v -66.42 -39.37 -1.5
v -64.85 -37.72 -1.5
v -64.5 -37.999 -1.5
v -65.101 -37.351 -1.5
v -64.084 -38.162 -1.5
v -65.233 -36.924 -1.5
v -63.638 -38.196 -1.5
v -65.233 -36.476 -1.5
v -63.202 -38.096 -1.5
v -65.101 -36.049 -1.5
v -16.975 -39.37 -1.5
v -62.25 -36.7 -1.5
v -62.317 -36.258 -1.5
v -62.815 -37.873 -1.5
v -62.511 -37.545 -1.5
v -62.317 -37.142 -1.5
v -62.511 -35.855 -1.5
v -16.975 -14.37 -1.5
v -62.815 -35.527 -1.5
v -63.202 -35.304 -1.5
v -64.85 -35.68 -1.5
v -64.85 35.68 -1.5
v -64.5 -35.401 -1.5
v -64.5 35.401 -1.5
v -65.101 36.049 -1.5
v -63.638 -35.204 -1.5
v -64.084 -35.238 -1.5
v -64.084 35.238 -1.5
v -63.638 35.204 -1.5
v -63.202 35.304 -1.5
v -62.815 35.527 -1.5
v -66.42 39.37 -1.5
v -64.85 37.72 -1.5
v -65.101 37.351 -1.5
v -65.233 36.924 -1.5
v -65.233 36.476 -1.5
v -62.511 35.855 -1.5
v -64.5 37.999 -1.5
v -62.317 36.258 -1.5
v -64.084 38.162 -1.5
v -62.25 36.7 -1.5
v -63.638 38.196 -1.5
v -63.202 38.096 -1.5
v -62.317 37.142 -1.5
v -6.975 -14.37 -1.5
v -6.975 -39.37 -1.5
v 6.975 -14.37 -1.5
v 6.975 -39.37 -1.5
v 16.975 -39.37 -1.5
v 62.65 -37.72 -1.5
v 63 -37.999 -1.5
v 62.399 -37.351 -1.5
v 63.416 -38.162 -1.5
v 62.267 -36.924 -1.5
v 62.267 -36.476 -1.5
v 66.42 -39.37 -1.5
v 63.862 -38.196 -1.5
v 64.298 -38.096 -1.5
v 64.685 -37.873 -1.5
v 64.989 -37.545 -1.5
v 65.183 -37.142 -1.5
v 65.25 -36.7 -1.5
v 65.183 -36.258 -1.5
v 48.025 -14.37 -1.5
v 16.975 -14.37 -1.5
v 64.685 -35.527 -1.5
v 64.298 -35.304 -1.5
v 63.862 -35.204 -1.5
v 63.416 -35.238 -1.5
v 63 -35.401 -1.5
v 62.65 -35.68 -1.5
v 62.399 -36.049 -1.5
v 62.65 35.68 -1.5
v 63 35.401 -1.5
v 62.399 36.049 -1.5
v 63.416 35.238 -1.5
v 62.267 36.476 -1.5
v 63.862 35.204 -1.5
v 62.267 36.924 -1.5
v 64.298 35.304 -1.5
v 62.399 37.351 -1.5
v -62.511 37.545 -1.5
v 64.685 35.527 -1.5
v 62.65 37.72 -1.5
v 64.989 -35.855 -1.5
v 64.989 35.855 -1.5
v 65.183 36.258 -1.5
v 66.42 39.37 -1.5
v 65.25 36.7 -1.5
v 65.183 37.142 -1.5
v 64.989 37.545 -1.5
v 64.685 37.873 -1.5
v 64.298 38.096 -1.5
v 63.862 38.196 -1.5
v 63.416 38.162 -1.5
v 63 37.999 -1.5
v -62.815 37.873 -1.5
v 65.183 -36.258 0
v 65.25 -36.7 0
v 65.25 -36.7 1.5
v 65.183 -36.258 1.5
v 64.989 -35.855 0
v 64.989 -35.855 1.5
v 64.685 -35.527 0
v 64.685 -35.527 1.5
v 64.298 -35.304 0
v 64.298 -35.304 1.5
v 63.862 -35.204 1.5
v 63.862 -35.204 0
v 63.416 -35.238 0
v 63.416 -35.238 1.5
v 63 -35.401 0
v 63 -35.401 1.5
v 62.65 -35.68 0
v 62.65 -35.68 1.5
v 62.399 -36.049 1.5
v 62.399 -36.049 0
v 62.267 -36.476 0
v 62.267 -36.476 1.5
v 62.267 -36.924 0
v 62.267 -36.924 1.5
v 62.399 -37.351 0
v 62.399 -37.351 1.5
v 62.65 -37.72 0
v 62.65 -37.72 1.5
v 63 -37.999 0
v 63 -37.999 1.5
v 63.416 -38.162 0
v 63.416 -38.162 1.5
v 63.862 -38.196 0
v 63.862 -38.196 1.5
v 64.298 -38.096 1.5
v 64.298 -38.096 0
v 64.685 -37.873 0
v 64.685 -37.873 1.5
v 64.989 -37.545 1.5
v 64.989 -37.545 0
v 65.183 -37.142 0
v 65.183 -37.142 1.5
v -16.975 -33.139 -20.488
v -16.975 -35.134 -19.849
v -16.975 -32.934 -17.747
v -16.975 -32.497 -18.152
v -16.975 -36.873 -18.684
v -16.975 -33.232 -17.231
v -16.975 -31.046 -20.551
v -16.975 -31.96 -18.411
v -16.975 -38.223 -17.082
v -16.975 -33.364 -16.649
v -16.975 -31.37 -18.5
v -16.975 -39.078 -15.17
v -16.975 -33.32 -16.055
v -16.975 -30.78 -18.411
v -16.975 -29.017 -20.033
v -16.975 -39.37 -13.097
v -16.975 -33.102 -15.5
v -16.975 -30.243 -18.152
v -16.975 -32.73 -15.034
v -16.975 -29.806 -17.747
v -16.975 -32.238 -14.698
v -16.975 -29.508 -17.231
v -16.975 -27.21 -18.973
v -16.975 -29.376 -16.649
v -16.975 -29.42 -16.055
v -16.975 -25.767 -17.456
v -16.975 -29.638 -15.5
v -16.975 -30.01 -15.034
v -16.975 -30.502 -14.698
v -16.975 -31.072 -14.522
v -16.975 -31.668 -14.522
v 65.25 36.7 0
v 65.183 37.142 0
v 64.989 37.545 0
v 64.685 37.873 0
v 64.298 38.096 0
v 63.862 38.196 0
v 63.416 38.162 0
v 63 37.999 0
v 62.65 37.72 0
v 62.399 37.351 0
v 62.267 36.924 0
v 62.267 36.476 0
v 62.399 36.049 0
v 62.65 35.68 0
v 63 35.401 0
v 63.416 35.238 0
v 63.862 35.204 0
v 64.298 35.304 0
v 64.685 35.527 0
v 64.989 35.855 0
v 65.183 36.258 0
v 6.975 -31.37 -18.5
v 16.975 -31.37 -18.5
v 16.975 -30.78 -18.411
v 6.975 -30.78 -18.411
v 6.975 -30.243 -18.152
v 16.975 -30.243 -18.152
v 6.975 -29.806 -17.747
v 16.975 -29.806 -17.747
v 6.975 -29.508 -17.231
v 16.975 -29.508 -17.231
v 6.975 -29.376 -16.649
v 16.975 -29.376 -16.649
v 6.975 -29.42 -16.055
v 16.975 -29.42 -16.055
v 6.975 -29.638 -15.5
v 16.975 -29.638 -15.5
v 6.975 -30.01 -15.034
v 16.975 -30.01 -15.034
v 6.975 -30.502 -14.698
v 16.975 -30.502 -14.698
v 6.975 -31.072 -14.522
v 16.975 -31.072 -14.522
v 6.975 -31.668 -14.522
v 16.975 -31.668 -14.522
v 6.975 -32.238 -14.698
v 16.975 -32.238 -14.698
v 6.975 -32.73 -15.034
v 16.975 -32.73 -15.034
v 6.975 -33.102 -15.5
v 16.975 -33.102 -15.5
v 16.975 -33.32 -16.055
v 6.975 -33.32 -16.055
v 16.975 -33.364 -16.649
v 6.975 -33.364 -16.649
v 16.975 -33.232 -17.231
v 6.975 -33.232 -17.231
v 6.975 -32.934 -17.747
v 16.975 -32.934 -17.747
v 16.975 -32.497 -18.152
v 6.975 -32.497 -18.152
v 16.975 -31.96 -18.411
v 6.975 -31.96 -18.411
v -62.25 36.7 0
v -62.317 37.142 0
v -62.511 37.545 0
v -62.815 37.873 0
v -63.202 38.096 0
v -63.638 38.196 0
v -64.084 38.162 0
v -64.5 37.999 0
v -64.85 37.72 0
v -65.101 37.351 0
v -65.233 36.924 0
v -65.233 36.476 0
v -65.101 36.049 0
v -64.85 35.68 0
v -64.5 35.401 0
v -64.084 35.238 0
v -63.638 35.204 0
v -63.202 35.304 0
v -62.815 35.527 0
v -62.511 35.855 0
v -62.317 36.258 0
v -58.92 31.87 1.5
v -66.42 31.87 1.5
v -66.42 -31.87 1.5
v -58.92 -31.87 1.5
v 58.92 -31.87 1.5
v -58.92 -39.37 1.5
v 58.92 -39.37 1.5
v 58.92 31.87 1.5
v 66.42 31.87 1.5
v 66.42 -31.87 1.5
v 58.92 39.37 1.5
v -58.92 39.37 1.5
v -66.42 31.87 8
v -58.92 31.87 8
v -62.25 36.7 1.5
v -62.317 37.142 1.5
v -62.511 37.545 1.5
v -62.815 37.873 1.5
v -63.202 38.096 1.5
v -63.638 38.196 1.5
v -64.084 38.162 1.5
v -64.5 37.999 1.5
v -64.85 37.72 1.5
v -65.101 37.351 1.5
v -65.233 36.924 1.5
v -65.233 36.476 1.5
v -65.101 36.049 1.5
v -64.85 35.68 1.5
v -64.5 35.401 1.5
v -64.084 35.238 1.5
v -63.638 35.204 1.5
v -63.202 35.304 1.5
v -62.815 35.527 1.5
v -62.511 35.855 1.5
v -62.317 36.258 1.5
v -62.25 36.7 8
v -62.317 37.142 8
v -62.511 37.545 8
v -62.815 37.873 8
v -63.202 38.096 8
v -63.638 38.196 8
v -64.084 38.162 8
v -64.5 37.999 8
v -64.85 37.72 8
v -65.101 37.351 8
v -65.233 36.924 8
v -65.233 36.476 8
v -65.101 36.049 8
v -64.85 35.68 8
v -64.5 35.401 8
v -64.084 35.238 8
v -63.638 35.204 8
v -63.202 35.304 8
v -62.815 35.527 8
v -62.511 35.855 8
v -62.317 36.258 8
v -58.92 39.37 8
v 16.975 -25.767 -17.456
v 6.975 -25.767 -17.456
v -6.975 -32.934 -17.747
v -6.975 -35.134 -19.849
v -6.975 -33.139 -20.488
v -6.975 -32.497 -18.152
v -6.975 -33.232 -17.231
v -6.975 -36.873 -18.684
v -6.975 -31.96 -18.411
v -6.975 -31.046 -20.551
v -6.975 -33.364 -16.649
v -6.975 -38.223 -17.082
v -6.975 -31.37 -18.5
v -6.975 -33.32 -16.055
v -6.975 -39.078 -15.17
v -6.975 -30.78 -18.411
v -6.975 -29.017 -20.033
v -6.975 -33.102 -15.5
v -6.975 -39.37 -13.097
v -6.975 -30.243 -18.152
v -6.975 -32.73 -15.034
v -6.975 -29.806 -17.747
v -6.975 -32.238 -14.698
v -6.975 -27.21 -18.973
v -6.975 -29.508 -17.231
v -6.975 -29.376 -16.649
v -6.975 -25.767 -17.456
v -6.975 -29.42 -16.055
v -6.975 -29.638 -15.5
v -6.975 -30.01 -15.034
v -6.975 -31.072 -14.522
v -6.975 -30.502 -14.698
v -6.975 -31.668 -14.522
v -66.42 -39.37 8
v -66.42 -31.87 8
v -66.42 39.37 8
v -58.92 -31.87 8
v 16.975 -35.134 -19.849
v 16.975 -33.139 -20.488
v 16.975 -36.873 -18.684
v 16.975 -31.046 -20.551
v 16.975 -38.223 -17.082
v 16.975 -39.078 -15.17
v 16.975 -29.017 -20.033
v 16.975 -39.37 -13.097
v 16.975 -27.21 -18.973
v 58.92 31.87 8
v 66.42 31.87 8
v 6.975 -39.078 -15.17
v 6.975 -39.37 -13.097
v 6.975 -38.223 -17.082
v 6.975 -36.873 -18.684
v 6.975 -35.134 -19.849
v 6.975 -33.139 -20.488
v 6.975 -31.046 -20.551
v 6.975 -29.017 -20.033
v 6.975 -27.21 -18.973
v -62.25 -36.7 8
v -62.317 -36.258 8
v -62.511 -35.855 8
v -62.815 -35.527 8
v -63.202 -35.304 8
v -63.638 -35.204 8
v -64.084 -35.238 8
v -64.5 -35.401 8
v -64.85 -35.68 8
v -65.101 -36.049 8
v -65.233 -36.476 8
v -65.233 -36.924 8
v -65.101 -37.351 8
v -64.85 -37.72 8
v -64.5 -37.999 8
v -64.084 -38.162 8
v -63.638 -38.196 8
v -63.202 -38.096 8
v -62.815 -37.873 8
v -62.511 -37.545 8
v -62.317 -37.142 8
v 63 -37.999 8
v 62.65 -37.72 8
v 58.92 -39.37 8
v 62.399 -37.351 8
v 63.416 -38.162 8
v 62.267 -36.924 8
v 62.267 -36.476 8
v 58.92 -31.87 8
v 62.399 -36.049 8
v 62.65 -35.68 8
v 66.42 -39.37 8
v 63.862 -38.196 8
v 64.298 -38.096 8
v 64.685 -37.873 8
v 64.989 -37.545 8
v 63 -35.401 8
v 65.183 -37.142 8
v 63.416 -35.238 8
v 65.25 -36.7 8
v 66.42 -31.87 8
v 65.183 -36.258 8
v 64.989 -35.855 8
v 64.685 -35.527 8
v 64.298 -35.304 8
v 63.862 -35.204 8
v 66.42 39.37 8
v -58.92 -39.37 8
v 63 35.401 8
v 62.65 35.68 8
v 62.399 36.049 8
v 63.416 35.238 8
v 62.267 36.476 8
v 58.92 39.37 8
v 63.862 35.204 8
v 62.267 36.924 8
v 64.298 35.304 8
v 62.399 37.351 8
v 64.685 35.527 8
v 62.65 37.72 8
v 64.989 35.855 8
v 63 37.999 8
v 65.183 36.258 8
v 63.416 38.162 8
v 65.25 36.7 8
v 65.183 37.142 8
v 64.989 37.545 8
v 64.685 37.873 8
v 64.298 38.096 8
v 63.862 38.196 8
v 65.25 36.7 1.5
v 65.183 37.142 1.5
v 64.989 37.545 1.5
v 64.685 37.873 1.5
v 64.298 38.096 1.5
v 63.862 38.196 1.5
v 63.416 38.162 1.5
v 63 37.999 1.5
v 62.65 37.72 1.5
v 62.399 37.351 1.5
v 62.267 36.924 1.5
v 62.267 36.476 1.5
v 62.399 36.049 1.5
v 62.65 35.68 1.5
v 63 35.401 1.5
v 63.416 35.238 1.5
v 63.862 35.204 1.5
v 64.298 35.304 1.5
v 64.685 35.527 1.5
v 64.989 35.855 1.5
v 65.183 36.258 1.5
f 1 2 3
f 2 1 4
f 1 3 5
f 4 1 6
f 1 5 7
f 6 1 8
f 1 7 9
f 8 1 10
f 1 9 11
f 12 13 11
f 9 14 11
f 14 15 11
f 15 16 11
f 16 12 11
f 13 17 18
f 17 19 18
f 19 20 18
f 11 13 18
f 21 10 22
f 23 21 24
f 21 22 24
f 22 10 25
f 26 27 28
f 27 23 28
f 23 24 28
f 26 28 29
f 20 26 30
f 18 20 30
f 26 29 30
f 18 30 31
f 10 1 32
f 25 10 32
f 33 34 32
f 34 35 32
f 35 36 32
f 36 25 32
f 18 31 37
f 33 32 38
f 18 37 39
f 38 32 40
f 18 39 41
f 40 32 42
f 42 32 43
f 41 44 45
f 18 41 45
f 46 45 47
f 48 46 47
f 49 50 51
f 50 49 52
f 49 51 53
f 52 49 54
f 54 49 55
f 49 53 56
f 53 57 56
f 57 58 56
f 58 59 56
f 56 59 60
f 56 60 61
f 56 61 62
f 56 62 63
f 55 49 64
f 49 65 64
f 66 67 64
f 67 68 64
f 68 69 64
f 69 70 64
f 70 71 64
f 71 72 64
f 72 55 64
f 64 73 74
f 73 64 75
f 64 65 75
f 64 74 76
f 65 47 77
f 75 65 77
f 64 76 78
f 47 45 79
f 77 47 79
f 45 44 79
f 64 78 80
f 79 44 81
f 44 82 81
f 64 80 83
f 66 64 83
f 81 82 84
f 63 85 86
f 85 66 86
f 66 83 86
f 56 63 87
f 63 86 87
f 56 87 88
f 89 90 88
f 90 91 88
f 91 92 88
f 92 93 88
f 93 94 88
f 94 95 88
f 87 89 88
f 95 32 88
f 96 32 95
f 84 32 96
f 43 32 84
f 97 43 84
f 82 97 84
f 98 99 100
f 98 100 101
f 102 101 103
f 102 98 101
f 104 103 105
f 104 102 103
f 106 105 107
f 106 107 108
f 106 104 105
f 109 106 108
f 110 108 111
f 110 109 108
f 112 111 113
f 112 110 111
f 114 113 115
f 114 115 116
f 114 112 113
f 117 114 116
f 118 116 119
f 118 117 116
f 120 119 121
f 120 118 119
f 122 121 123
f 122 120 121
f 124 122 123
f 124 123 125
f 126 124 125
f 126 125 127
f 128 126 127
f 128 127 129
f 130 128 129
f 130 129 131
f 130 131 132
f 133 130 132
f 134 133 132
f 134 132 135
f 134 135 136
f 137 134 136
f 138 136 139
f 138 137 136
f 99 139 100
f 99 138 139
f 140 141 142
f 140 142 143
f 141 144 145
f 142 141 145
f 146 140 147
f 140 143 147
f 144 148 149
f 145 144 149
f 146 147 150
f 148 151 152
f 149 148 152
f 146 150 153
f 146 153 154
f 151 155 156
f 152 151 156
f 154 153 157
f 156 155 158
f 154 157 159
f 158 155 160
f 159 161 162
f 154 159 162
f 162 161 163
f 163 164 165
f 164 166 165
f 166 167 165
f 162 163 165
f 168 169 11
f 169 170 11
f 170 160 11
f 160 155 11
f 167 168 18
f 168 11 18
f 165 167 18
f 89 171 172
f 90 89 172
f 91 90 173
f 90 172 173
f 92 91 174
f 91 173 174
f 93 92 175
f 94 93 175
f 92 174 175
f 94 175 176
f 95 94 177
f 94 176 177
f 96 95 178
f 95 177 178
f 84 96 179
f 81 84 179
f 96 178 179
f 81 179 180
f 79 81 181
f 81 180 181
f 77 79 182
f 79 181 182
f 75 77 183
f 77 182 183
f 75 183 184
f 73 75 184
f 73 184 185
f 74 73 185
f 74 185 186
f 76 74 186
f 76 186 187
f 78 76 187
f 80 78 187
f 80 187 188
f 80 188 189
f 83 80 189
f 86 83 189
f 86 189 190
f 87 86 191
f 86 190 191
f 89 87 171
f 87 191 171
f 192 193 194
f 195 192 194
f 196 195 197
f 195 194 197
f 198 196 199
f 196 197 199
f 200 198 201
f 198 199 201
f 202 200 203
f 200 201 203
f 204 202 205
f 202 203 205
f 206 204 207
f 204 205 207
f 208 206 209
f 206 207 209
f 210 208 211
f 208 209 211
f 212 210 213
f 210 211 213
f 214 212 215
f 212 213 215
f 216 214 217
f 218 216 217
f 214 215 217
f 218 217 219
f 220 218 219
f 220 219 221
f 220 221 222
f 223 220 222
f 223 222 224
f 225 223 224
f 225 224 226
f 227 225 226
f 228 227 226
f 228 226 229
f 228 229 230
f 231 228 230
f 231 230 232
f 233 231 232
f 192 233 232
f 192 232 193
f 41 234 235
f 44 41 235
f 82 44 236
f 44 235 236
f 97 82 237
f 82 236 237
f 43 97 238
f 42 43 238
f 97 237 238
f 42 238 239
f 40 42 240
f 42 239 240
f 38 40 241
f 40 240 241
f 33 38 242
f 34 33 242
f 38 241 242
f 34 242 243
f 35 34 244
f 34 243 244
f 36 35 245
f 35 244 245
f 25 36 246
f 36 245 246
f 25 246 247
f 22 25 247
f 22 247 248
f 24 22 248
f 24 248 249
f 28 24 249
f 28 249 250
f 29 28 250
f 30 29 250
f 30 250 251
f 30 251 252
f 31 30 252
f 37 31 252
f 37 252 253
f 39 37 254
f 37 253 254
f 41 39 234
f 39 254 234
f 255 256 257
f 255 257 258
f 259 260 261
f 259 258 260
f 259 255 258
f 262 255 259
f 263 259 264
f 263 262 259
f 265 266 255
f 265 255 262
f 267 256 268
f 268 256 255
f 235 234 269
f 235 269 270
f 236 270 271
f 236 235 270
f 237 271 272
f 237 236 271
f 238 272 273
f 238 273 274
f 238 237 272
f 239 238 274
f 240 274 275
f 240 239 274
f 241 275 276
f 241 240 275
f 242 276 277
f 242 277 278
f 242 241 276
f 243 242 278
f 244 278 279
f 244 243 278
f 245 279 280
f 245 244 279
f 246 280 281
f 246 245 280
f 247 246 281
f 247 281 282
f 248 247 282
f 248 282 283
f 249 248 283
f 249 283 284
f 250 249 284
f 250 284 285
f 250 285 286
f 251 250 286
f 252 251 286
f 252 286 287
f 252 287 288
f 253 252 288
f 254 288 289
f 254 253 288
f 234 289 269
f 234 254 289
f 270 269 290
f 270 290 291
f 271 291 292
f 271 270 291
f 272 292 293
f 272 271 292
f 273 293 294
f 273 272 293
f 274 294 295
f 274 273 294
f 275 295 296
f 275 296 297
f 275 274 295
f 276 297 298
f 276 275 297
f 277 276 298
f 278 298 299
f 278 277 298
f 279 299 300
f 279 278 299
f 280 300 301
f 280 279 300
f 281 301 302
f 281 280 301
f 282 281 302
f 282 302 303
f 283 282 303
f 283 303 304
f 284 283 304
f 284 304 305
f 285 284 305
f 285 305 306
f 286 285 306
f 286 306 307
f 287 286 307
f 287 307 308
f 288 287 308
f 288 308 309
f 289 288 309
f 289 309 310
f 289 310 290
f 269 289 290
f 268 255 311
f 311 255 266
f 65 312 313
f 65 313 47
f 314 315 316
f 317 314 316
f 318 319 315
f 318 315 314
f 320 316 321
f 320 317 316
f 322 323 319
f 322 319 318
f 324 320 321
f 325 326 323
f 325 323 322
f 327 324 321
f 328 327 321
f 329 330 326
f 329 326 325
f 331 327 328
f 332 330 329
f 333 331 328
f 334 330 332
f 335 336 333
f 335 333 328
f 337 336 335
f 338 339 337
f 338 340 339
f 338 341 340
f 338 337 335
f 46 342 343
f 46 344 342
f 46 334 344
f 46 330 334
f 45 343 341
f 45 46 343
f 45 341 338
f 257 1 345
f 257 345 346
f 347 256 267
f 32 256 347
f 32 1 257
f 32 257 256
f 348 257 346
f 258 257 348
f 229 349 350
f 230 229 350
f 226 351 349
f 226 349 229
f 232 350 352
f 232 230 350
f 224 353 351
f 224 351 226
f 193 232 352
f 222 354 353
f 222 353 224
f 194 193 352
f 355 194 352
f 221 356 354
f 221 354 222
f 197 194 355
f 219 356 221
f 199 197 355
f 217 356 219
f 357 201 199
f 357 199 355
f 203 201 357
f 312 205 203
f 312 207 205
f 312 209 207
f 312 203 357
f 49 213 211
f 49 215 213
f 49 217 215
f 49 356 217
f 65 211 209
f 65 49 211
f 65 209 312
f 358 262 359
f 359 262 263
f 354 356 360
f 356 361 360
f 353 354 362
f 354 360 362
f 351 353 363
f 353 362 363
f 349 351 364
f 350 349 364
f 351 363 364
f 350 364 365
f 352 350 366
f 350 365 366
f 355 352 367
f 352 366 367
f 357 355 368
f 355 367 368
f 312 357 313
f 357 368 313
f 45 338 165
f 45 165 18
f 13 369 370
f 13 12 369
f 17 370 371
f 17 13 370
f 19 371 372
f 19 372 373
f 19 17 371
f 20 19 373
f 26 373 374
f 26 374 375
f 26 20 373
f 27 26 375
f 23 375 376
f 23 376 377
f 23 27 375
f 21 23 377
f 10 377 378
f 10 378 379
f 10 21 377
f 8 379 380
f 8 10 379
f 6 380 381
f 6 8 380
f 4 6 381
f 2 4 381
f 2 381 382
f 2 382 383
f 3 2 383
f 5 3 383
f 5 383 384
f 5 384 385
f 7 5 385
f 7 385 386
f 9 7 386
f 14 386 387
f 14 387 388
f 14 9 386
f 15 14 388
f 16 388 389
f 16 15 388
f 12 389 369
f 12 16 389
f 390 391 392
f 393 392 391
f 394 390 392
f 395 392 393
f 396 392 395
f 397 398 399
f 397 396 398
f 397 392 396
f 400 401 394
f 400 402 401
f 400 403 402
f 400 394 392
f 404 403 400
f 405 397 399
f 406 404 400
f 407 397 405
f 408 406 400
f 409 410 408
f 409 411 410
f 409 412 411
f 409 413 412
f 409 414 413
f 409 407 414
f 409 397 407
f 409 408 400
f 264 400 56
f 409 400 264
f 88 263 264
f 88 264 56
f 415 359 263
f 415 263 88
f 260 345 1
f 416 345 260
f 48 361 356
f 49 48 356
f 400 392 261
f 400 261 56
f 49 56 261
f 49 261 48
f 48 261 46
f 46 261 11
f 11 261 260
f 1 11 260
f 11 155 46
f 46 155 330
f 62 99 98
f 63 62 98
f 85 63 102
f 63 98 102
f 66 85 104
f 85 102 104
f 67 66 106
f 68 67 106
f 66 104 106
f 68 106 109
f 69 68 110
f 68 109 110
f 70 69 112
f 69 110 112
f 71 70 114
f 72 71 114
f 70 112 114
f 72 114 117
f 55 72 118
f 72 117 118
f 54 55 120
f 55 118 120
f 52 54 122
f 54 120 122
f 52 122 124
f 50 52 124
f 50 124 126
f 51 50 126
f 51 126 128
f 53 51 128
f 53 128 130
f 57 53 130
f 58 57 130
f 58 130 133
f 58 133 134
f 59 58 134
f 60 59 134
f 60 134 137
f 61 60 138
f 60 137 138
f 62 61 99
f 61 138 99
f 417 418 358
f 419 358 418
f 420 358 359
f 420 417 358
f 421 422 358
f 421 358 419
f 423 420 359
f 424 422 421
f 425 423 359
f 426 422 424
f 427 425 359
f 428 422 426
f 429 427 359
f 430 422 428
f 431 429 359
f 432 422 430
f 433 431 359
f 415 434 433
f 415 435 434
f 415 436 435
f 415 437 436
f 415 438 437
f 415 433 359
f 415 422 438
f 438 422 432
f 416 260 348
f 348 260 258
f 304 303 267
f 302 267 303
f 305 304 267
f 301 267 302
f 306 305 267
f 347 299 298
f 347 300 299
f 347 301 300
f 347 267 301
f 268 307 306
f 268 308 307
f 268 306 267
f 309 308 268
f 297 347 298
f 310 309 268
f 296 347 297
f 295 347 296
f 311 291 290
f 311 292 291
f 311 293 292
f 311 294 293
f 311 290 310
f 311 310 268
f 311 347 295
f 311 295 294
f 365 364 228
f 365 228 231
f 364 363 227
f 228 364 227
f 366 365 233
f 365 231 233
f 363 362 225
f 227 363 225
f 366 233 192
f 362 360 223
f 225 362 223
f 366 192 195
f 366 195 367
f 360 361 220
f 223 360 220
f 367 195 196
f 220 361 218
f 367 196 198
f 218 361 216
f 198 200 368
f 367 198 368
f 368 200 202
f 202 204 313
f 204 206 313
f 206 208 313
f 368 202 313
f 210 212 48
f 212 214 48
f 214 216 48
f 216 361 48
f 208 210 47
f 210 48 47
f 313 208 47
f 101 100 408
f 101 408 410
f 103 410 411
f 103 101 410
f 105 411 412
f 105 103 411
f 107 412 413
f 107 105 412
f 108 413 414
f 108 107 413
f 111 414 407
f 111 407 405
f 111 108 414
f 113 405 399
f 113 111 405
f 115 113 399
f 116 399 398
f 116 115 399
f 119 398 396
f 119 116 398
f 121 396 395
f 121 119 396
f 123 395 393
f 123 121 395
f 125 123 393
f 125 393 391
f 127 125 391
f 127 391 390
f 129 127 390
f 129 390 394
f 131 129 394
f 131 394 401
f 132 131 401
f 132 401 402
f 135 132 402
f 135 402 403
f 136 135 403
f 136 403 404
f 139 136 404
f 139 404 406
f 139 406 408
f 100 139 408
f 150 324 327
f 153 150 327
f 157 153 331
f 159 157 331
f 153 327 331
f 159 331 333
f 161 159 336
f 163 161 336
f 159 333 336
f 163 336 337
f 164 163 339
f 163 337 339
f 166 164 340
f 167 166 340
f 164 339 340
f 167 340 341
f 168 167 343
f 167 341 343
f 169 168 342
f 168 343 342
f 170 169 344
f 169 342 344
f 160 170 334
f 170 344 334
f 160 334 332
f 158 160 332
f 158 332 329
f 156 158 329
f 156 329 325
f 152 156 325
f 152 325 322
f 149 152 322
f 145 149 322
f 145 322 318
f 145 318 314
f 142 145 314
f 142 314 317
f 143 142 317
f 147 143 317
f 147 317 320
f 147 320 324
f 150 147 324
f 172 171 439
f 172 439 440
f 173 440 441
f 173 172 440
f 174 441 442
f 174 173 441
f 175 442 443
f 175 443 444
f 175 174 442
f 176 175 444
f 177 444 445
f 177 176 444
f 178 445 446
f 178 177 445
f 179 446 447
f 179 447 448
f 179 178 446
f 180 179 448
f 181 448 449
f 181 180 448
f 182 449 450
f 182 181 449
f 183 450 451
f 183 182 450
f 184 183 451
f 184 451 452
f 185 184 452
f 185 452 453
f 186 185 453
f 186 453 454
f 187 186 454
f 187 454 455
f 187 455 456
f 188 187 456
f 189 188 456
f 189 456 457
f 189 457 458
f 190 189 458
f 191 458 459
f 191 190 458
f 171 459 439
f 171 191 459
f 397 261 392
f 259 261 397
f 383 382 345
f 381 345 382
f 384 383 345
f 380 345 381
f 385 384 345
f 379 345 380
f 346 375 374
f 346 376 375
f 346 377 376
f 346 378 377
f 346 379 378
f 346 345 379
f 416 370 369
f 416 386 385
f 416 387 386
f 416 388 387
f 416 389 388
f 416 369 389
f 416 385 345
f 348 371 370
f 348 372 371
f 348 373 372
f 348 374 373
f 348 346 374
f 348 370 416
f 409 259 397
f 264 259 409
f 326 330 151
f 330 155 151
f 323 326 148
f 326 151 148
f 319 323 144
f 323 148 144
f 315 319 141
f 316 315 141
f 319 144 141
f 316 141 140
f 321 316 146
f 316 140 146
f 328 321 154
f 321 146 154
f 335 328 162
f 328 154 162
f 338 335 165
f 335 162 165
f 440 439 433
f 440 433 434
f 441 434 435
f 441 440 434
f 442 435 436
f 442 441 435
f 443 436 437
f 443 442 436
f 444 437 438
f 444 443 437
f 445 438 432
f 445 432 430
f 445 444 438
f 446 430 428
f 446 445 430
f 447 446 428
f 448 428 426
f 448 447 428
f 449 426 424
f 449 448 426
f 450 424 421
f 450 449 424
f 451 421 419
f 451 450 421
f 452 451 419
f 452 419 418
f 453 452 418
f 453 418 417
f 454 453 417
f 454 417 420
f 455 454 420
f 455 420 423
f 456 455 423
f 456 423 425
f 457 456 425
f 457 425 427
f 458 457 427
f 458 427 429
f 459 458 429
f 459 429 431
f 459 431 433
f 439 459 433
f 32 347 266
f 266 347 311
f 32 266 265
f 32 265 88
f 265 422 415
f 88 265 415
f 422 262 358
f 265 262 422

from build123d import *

# Parameters (mm, degrees)
SKETCH1_W               = 7.5
SKETCH1_H               = 7.5
SKETCH1_R               = 1.5
BOSS_EXTRUDE1_DEPTH     = 1.5
SKETCH1_3_W             = 7.5
SKETCH1_3_H             = 7.5
SKETCH1_3_R             = 1.5
BOSS_EXTRUDE2_DEPTH     = 8
SKETCH2_W               = 10
SKETCH2_H               = 25
BOSS_EXTRUDE3_DEPTH     = 35
CUT_EXTRUDE1_DEPTH      = 100.181515037
CUT_EXTRUDE1_DEPTH_BACK = 65
SKETCH4_R               = 2
CUT_EXTRUDE2_DEPTH      = 65
FILLET1_R               = 7.5


with BuildPart() as part:
    # Sketch1 → Boss-Extrude1 (new, symmetric)
    # profile 1 of 5: a face of its own
    with BuildSketch(Plane.XY):
        Polygon((-58.92, -31.87), (-58.92, -39.37), (58.92, -39.37), (58.92, -31.87), (66.42, -31.87), (66.42, 31.87), (58.92, 31.87), (58.92, 39.37), (-58.92, 39.37), (-58.92, 31.87), (-66.42, 31.87), (-66.42, -31.87), align=None)
    # profile 2 of 5: a face of its own
    with BuildSketch(Plane.XY):
        with Locations((-62.67, -35.62)):
            Rectangle(SKETCH1_W, SKETCH1_H)
        with Locations((-63.75, -36.7)):
            Circle(SKETCH1_R, mode=Mode.SUBTRACT)
    # profile 3 of 5: a face of its own
    with BuildSketch(Plane.XY):
        with Locations((-62.67, 35.62)):
            Rectangle(SKETCH1_W, SKETCH1_H)
        with Locations((-63.75, 36.7)):
            Circle(SKETCH1_R, mode=Mode.SUBTRACT)
    # profile 4 of 5: a face of its own
    with BuildSketch(Plane.XY):
        with Locations((62.67, 35.62)):
            Rectangle(SKETCH1_W, SKETCH1_H)
        with Locations((63.75, 36.7)):
            Circle(SKETCH1_R, mode=Mode.SUBTRACT)
    # profile 5 of 5: a face of its own
    with BuildSketch(Plane.XY):
        with Locations((62.67, -35.62)):
            Rectangle(SKETCH1_W, SKETCH1_H)
        with Locations((63.75, -36.7)):
            Circle(SKETCH1_R, mode=Mode.SUBTRACT)
    extrude(amount=BOSS_EXTRUDE1_DEPTH, both=True)

    # Sketch1<3> → Boss-Extrude2 (add)
    # profile 1 of 4: a face of its own
    with BuildSketch(Plane.XY):
        with Locations((-62.67, -35.62)):
            Rectangle(SKETCH1_3_W, SKETCH1_3_H)
        with Locations((-63.75, -36.7)):
            Circle(SKETCH1_3_R, mode=Mode.SUBTRACT)
    # profile 2 of 4: a face of its own
    with BuildSketch(Plane.XY):
        with Locations((-62.67, 35.62)):
            Rectangle(SKETCH1_3_W, SKETCH1_3_H)
        with Locations((-63.75, 36.7)):
            Circle(SKETCH1_3_R, mode=Mode.SUBTRACT)
    # profile 3 of 4: a face of its own
    with BuildSketch(Plane.XY):
        with Locations((62.67, 35.62)):
            Rectangle(SKETCH1_3_W, SKETCH1_3_H)
        with Locations((63.75, 36.7)):
            Circle(SKETCH1_3_R, mode=Mode.SUBTRACT)
    # profile 4 of 4: a face of its own
    with BuildSketch(Plane.XY):
        with Locations((62.67, -35.62)):
            Rectangle(SKETCH1_3_W, SKETCH1_3_H)
        with Locations((63.75, -36.7)):
            Circle(SKETCH1_3_R, mode=Mode.SUBTRACT)
    extrude(amount=BOSS_EXTRUDE2_DEPTH)

    # Sketch2 → Boss-Extrude3 (add)
    with BuildSketch(Plane(origin=(0, 0, -1.5), x_dir=(-1, 0, 0), z_dir=(0, 0, -1))):
        with Locations((-11.975, -26.87)):
            Rectangle(SKETCH2_W, SKETCH2_H)
        with Locations((11.975, -26.87)):
            Rectangle(SKETCH2_W, SKETCH2_H)
    extrude(amount=BOSS_EXTRUDE3_DEPTH)

    # Sketch3 → Cut-Extrude1 (cut, two sides: drawn at the far end of the back side and taken through both)
    with BuildSketch(Plane.ZY.offset(16.975).offset(-CUT_EXTRUDE1_DEPTH_BACK)):
        Polygon((-36.5, -14.37), (-36.5, -39.37), (-1.5, -14.37), align=None)
    extrude(amount=CUT_EXTRUDE1_DEPTH + CUT_EXTRUDE1_DEPTH_BACK, mode=Mode.SUBTRACT)

    # Sketch4 → Cut-Extrude2 (cut)
    with BuildSketch(Plane(origin=(16.975, 0, 0), x_dir=(0, 0, -1), z_dir=(1, 0, 0))):
        with Locations((16.5, -31.37)):
            Circle(SKETCH4_R)
    extrude(amount=-CUT_EXTRUDE2_DEPTH, mode=Mode.SUBTRACT)

    # Fillet1
    fillet1_edges = [part.edges().sort_by_distance(p)[0] for p in [
        (11.975, -39.37, -36.5),
        (-11.975, -39.37, -36.5),
    ]]
    fillet(fillet1_edges, radius=FILLET1_R)


solid = part.part
